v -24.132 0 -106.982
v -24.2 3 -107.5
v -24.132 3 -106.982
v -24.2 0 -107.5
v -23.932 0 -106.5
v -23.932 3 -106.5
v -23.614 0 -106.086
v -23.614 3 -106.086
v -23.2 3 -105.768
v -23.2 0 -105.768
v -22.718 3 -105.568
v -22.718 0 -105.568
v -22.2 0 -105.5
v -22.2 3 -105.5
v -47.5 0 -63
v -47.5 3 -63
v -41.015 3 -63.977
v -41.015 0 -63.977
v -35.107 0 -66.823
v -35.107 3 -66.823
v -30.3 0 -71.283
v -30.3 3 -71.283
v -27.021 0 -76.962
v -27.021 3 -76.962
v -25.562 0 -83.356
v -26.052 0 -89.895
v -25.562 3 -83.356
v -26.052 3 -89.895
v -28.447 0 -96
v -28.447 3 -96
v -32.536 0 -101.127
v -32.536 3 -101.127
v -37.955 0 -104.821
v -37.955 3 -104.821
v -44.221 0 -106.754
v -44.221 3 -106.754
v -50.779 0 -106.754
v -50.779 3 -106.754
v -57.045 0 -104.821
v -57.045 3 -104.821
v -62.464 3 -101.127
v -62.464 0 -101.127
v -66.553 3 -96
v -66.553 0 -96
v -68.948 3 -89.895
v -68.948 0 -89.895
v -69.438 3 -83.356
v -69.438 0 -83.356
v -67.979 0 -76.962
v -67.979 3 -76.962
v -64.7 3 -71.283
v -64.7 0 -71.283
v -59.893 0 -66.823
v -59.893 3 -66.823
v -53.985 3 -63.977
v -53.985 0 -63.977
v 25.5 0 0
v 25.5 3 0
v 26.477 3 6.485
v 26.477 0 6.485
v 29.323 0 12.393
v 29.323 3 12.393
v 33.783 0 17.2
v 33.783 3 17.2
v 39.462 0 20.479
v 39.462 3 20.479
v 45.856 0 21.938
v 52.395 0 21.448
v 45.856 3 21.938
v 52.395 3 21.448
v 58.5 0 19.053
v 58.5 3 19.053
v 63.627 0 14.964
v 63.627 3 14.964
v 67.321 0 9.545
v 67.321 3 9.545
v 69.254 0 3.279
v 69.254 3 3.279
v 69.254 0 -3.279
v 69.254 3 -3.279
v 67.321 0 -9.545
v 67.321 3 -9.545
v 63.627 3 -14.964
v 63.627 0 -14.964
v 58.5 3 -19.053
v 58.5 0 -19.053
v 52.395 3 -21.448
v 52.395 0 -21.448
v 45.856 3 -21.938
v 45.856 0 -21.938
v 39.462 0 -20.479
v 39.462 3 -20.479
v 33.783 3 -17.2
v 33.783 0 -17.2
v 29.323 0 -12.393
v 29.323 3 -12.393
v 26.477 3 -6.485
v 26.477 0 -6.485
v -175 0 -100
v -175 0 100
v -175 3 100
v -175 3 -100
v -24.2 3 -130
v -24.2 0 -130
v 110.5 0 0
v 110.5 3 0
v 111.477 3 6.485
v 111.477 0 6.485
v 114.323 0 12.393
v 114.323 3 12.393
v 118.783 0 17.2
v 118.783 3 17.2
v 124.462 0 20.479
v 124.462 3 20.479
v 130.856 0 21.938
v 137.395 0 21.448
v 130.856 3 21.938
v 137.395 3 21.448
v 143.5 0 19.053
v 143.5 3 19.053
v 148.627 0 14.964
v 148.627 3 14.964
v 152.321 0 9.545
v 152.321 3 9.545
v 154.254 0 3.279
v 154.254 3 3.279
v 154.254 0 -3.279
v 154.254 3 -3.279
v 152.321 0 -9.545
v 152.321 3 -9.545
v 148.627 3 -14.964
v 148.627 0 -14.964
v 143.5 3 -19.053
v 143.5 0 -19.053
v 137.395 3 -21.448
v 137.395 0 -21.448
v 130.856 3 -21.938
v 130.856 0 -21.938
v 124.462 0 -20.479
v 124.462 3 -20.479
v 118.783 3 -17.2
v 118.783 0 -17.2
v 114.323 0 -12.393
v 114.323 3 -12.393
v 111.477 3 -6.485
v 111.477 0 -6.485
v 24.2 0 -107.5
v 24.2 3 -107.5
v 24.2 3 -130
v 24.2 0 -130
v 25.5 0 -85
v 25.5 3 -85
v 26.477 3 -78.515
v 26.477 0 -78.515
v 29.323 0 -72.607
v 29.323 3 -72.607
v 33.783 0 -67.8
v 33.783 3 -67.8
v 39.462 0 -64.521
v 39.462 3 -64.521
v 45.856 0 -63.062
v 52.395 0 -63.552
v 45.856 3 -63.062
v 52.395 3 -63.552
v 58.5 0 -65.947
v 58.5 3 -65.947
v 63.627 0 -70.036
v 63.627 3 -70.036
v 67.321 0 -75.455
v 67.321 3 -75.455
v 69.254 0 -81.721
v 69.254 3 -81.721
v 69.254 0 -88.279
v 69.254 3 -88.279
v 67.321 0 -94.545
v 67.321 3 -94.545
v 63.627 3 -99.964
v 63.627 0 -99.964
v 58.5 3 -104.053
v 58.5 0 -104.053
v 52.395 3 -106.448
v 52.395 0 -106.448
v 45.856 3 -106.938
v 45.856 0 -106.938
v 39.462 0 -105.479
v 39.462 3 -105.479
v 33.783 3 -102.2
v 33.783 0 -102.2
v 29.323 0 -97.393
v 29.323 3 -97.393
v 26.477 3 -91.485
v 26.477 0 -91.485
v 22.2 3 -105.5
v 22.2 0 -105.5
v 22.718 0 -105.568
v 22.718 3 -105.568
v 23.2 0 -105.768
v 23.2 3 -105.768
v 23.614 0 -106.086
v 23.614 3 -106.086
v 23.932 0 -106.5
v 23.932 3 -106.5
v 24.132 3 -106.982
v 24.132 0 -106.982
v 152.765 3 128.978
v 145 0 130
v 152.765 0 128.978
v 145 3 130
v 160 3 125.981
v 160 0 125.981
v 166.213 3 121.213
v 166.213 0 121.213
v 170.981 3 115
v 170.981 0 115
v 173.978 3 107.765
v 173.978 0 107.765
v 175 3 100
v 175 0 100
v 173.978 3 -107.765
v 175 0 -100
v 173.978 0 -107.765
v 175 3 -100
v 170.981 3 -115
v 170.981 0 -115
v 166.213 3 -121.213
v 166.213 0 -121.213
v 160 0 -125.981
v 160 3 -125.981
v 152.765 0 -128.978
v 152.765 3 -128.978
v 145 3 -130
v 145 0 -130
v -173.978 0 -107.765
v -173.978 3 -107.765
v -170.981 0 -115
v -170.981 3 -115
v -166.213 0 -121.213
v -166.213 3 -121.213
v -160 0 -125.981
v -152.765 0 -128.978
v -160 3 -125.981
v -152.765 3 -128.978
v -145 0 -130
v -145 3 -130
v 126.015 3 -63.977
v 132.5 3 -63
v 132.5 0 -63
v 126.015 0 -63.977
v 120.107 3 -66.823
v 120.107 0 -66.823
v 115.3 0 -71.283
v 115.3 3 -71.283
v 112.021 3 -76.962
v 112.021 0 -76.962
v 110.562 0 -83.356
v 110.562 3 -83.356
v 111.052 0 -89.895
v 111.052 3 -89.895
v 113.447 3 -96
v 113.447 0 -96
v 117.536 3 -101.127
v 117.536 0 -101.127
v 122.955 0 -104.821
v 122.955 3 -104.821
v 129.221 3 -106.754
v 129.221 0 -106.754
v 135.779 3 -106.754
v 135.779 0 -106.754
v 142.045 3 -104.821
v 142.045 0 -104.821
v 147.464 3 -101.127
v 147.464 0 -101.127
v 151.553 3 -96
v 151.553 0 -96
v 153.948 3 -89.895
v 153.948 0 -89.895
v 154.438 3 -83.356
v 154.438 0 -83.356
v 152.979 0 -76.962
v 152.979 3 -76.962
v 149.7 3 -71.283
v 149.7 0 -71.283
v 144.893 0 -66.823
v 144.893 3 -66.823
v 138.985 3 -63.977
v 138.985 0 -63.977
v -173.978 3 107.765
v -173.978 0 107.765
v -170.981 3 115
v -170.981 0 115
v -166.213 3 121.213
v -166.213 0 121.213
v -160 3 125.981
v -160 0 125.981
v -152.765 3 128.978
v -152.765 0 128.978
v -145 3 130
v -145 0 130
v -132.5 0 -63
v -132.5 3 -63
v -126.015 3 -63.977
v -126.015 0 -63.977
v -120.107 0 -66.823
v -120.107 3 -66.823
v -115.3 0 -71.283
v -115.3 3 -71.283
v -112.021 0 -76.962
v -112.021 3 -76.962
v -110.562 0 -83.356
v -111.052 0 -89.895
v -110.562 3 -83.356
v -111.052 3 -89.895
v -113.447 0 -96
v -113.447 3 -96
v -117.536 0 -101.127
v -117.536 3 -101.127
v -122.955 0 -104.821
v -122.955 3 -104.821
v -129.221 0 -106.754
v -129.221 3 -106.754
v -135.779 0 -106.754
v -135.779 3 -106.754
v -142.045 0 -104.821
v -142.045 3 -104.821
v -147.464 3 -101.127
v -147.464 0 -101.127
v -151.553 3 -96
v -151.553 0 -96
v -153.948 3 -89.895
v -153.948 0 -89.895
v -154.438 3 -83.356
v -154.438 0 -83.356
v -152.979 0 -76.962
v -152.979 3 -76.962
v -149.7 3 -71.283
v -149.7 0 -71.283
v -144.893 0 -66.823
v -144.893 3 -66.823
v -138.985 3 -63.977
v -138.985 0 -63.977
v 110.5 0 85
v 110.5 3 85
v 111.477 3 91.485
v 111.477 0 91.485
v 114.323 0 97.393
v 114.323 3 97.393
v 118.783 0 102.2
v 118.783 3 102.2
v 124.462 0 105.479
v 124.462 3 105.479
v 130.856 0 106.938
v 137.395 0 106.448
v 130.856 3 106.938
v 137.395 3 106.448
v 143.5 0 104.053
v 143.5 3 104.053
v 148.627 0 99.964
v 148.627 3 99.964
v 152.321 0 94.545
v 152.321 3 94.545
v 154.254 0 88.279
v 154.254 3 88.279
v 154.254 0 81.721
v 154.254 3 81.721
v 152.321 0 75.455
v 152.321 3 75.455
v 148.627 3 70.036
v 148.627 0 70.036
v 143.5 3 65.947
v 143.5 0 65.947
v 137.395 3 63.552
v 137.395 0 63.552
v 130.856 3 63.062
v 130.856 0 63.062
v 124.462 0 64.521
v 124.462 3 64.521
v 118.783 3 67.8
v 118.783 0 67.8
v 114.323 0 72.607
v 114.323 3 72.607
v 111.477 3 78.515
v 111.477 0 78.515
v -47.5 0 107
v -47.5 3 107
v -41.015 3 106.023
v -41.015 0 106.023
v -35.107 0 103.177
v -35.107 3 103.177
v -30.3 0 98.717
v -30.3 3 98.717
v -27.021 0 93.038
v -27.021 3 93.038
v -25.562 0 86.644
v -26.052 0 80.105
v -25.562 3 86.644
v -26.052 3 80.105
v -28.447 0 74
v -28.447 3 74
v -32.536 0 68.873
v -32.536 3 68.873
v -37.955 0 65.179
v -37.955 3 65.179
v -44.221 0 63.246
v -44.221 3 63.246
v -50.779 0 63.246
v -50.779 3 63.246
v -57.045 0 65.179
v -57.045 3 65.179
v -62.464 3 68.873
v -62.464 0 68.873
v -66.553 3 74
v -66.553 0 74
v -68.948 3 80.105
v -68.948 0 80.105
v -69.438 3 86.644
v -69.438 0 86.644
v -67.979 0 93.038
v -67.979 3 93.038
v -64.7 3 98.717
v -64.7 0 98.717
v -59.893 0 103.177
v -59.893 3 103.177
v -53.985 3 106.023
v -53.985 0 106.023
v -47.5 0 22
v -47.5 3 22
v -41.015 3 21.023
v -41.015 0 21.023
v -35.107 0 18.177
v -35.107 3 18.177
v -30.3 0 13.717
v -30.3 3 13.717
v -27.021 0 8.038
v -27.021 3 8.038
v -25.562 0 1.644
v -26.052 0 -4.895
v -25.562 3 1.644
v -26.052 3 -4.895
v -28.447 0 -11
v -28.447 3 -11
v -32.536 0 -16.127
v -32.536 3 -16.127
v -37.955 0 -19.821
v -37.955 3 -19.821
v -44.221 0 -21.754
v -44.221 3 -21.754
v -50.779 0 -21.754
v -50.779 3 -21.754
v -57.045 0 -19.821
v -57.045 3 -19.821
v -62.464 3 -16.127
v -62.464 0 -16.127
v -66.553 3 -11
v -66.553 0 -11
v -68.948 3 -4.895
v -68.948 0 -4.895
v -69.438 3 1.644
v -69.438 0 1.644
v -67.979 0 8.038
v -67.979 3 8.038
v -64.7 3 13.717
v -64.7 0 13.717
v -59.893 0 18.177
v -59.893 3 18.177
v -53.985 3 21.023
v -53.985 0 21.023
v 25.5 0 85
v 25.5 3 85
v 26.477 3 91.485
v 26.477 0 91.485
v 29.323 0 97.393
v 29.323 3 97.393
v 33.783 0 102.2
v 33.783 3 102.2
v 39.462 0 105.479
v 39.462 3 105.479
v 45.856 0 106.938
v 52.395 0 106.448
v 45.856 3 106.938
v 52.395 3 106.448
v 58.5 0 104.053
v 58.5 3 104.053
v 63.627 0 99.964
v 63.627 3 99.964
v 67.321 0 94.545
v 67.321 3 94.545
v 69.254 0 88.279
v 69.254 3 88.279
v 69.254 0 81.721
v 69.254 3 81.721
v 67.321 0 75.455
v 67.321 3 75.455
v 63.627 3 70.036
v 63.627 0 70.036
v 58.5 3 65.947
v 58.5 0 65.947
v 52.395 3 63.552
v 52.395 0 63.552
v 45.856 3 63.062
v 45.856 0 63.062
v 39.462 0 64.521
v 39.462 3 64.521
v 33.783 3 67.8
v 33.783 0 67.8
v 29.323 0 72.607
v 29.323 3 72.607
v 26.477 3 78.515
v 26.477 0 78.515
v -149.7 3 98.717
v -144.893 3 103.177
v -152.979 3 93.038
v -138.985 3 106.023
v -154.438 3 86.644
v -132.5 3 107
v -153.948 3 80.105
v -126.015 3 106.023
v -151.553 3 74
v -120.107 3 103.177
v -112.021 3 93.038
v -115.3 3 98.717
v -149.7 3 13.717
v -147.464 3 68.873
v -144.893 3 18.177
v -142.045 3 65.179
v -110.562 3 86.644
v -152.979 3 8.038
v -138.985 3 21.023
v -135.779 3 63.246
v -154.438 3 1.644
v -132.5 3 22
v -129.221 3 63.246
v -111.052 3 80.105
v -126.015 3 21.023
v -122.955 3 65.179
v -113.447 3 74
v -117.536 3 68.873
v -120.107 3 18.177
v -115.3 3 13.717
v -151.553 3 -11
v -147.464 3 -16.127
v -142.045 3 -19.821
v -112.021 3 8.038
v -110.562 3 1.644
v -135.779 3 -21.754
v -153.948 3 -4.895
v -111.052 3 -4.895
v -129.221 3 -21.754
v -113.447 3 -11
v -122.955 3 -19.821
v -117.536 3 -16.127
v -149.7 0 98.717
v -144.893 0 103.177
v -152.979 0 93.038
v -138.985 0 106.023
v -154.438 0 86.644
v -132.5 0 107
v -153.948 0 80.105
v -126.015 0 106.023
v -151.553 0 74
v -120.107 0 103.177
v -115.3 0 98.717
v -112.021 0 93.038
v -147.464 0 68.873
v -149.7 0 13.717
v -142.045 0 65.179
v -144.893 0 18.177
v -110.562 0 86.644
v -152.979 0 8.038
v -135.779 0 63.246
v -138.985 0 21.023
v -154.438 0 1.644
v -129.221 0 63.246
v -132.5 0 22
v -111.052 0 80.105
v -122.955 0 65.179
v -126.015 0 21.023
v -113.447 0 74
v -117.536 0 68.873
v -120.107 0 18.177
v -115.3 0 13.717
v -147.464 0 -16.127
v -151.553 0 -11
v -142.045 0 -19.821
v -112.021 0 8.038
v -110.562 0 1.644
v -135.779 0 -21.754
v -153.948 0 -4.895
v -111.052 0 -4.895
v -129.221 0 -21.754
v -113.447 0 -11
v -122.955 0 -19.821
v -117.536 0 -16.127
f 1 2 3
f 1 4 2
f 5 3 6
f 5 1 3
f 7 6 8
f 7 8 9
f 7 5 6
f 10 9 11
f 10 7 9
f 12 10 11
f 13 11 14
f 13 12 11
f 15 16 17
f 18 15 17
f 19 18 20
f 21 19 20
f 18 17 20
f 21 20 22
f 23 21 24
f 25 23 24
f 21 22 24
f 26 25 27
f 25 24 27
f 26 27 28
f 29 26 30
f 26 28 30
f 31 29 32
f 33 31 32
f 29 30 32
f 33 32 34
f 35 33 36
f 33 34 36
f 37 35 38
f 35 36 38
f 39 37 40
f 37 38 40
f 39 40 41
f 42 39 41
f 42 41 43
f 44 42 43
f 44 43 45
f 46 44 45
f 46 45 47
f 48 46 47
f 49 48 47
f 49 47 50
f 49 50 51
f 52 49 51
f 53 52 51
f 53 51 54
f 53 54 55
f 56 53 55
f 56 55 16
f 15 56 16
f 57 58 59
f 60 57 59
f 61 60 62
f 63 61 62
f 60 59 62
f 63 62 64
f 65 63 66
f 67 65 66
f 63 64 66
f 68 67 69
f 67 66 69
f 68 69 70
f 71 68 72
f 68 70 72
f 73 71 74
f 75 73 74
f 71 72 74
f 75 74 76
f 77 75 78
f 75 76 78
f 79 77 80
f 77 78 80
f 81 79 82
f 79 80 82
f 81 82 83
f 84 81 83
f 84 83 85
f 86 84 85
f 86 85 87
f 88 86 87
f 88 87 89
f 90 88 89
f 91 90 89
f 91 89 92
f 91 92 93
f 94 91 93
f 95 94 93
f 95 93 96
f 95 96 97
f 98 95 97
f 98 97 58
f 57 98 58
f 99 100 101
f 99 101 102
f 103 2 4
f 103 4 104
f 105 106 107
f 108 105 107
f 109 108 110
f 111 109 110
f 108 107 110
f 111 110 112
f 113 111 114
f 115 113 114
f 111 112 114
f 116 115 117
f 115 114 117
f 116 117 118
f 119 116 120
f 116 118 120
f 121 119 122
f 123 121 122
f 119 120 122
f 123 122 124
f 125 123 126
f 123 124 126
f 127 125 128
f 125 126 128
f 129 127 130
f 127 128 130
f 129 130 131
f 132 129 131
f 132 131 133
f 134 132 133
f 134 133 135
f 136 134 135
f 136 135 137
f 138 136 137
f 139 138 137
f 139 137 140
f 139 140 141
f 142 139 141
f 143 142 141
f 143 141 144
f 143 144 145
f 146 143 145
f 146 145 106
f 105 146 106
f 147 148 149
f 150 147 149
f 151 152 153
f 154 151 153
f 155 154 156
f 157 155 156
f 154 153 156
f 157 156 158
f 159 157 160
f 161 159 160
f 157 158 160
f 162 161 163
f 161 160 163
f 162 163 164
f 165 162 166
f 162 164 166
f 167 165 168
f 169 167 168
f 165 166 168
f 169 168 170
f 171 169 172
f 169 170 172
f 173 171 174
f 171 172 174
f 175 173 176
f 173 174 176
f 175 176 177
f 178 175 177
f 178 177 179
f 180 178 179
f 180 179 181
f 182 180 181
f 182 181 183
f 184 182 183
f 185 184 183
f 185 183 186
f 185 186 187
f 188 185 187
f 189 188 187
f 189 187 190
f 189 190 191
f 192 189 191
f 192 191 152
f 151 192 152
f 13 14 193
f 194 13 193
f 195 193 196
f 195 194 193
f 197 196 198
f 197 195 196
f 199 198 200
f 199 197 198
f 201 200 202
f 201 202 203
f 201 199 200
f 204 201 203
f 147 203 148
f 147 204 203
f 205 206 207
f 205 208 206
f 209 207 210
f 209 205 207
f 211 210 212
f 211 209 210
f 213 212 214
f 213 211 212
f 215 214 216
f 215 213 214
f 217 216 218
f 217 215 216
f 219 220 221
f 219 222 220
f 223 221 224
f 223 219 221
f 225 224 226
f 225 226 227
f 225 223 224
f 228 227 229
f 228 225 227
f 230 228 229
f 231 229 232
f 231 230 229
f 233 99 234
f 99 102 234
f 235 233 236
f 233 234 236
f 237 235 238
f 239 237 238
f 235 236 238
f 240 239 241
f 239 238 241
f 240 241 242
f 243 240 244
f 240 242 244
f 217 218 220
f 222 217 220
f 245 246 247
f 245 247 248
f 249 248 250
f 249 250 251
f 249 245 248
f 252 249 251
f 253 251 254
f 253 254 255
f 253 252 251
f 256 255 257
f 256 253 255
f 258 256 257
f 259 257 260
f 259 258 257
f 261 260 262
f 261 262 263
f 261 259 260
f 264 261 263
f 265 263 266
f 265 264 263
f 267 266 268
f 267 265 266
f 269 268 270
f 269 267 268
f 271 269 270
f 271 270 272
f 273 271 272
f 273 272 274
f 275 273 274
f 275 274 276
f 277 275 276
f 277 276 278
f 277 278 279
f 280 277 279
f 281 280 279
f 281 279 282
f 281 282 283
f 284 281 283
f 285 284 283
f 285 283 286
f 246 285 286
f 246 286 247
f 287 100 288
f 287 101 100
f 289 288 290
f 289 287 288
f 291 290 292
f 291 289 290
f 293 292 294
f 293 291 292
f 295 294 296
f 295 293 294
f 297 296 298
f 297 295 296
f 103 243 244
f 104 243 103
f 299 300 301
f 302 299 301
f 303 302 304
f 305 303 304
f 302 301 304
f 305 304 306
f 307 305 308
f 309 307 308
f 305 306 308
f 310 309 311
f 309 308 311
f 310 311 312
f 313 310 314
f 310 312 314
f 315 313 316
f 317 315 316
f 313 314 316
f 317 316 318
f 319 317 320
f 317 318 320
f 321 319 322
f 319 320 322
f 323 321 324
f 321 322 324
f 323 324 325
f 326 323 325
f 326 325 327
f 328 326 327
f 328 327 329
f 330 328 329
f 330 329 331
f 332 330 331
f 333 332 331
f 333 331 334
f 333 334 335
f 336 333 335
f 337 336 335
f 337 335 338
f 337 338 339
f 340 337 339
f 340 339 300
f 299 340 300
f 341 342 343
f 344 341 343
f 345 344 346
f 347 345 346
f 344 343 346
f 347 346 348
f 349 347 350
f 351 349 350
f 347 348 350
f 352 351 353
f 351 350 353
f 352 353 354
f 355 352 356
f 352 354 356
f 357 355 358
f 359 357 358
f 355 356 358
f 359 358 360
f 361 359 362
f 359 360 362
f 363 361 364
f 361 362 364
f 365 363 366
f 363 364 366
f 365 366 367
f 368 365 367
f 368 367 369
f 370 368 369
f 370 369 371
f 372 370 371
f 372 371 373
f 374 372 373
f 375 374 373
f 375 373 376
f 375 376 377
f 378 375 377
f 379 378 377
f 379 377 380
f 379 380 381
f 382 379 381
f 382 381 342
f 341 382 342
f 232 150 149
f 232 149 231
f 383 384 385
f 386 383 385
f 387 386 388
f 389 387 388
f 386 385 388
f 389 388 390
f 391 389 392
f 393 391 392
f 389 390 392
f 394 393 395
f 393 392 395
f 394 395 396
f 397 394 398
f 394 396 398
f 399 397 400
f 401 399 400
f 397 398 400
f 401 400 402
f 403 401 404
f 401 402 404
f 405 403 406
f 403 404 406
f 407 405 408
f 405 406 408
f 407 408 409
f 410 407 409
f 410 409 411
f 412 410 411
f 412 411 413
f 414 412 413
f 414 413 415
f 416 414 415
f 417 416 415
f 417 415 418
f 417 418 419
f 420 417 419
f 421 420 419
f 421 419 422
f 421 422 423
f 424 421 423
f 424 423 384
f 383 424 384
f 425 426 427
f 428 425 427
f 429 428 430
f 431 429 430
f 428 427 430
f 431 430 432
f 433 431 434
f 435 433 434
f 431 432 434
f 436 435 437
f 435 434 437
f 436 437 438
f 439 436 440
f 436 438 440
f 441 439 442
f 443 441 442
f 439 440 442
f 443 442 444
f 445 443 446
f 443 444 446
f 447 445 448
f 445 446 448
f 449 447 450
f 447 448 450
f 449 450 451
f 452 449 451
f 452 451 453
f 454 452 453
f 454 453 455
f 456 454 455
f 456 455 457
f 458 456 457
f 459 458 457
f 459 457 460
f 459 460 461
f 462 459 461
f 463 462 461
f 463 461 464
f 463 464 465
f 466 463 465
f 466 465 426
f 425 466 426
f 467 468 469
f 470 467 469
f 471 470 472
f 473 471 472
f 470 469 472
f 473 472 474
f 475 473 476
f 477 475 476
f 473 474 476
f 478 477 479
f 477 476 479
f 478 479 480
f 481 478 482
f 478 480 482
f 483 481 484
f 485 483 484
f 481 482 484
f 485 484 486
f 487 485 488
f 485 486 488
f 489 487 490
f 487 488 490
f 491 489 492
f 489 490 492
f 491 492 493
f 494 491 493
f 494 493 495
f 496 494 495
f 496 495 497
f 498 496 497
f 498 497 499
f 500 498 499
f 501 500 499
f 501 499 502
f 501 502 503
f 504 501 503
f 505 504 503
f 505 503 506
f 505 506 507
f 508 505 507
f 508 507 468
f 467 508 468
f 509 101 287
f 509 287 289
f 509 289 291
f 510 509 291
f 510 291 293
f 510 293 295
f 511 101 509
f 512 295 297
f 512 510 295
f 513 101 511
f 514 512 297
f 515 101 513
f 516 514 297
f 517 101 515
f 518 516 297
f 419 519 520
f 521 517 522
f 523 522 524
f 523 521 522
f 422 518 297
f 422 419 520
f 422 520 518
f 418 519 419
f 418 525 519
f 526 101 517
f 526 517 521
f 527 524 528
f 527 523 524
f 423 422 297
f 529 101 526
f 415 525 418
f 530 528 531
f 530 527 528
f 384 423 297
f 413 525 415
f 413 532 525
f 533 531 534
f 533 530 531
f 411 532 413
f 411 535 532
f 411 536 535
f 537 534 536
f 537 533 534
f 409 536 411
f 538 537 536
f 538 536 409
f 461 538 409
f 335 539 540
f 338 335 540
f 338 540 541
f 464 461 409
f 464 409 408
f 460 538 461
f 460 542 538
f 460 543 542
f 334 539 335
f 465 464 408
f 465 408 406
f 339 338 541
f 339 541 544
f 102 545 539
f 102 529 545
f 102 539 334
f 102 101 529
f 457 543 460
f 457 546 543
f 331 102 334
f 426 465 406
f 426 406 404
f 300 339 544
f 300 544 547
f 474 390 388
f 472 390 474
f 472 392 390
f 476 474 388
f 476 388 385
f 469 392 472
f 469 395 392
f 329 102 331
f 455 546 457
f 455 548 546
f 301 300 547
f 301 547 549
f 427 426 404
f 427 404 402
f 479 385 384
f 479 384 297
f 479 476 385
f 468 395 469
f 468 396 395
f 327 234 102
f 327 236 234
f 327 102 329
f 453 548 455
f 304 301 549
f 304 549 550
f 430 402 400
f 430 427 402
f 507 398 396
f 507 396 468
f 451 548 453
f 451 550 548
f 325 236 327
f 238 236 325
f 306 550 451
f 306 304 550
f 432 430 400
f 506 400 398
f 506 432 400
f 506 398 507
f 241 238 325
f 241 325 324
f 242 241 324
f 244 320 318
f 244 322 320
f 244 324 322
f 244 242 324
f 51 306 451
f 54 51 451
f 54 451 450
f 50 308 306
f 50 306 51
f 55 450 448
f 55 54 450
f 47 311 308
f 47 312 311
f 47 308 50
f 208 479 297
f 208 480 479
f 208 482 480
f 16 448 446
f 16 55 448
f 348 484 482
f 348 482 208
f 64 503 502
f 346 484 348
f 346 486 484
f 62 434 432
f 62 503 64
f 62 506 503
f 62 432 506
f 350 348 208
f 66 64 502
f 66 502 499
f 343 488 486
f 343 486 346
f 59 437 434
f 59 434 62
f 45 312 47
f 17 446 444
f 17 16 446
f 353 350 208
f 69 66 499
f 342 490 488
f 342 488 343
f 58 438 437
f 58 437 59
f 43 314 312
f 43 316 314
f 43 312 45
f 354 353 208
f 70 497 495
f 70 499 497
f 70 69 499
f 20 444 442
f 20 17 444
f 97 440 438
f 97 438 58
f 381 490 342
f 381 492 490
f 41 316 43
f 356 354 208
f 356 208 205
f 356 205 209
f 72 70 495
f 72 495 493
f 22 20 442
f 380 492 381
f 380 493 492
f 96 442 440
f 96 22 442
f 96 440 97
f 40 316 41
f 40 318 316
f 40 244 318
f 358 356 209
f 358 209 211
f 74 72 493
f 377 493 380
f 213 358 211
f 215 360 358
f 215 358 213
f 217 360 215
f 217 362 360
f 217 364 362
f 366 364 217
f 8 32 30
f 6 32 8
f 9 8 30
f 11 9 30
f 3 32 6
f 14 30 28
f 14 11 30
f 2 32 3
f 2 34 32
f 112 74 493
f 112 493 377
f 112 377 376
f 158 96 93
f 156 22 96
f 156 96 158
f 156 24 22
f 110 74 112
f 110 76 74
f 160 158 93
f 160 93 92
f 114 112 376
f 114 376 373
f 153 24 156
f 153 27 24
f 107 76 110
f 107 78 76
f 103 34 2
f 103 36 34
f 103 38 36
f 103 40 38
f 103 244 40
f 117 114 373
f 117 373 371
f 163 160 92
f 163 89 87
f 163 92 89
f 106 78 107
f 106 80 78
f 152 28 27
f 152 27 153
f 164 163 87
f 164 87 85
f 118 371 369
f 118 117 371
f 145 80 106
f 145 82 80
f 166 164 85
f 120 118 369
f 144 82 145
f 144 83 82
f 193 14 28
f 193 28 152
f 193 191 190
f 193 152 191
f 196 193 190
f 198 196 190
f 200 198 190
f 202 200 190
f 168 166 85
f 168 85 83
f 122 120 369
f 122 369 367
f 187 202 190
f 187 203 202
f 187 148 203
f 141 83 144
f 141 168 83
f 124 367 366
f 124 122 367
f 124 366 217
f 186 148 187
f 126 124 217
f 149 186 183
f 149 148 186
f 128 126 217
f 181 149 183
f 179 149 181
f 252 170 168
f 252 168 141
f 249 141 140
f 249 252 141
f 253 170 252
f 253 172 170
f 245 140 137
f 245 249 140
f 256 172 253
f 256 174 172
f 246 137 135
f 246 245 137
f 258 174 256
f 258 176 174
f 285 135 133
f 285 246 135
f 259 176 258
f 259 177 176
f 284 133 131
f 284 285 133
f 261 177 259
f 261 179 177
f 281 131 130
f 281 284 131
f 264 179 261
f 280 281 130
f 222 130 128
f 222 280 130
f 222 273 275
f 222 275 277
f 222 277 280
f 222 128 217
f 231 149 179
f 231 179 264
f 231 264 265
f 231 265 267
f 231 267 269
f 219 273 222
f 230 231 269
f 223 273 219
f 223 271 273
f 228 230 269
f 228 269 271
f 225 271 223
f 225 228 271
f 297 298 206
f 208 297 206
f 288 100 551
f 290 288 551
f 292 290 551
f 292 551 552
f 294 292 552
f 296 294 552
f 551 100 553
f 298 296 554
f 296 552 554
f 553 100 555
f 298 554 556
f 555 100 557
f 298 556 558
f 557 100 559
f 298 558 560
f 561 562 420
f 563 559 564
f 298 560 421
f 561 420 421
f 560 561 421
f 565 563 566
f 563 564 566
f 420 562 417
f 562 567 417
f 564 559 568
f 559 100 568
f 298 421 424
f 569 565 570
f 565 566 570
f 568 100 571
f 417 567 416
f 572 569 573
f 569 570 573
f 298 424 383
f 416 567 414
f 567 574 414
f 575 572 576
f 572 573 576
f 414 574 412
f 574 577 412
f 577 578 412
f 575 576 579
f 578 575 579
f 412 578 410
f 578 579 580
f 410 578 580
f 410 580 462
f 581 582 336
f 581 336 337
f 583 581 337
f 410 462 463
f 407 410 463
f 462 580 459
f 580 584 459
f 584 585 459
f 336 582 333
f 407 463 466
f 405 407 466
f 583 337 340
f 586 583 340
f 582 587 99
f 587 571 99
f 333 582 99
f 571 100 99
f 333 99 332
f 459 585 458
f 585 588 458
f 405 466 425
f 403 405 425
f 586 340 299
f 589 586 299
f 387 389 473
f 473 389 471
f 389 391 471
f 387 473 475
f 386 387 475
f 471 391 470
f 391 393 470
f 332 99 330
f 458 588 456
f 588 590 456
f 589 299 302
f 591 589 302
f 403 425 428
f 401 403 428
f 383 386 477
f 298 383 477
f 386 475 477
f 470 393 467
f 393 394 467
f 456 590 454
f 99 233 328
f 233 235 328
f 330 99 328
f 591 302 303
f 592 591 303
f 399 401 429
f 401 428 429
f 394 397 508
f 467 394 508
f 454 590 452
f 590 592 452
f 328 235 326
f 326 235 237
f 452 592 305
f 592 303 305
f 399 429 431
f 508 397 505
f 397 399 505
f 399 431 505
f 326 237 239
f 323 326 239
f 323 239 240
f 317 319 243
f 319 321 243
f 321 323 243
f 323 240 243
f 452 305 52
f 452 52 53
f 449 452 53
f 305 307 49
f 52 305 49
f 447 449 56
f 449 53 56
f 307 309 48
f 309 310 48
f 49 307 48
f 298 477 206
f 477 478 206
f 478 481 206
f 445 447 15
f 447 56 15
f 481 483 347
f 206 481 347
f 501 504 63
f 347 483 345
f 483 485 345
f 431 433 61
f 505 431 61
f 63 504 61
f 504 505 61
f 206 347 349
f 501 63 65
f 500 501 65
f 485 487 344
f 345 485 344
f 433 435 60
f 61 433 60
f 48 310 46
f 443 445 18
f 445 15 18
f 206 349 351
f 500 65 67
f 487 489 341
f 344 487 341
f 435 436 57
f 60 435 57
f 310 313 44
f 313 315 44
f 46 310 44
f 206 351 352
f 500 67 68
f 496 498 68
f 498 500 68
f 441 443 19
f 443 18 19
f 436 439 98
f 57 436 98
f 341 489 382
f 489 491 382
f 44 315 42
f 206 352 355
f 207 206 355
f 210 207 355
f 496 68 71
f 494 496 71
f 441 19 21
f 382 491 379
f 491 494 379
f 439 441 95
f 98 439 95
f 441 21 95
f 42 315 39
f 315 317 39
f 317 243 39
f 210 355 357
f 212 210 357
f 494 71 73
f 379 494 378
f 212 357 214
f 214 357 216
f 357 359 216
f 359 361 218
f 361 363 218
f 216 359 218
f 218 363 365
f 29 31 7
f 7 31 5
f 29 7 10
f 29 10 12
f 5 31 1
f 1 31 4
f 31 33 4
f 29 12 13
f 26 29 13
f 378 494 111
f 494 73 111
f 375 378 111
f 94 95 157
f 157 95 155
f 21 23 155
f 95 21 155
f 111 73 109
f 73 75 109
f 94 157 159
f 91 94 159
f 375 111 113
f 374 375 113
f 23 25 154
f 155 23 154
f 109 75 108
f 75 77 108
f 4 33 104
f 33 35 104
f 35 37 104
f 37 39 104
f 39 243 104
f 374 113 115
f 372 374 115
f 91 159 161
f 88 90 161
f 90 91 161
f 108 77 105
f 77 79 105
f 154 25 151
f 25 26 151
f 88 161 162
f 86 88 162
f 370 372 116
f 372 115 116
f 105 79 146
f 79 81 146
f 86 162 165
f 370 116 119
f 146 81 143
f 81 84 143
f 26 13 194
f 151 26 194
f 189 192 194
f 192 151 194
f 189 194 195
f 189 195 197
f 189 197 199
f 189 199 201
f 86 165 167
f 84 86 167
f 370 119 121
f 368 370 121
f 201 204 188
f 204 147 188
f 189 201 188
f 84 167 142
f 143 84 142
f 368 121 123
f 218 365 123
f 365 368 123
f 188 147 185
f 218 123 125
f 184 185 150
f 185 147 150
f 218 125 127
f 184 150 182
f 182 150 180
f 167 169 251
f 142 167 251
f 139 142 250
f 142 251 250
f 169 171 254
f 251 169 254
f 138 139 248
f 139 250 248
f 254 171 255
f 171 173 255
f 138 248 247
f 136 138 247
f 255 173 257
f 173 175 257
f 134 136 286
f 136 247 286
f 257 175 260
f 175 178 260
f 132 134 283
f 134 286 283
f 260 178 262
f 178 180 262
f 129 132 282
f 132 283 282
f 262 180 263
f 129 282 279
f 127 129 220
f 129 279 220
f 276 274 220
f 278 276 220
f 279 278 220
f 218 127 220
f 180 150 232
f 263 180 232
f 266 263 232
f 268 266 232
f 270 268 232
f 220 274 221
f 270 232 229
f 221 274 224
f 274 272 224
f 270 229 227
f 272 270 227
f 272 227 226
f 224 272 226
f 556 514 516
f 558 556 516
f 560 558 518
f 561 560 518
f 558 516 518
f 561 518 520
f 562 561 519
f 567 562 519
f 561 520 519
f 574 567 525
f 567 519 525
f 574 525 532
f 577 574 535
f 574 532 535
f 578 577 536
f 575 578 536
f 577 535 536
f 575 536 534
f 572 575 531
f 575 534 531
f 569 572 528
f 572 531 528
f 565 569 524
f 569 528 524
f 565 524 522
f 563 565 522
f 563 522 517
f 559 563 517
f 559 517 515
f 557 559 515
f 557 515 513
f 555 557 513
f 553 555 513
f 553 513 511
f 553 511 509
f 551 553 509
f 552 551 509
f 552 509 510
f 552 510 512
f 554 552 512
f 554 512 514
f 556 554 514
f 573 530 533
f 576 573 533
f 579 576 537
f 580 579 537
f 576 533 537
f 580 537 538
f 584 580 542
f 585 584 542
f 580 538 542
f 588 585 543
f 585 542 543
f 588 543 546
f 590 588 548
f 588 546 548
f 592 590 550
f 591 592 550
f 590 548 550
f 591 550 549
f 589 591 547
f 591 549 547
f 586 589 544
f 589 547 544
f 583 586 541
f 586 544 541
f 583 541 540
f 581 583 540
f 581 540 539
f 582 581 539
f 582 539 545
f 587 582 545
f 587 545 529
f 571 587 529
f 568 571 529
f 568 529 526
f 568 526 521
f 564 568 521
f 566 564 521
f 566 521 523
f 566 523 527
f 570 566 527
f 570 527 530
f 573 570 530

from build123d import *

# Parameters (mm, degrees)
SKETCH_1_W                  = 350
SKETCH_1_H                  = 260
EXTRUDE_1_DEPTH             = 3
FILLET_2_R                  = 30
CUT_EXTRUDE_2_REACH         = 220.023
SKETCH_3_R                  = 22
PATTERN_LINEAR_1_COUNT      = 2
PATTERN_LINEAR_1_PITCH      = 85
PATTERN_LINEAR_1_COUNT_DIR2 = 3
PATTERN_LINEAR_1_PITCH_DIR2 = 85
MIRROR_1_COPY_1_REACH       = 220.023
MIRROR_1_COPY_1_SKETCH_R    = 22
MIRROR_1_COPY_2_REACH       = 220.023
MIRROR_1_COPY_2_SKETCH_R    = 22
MIRROR_1_COPY_3_REACH       = 220.023
MIRROR_1_COPY_3_SKETCH_R    = 22
MIRROR_1_COPY_4_REACH       = 220.023
MIRROR_1_COPY_4_SKETCH_R    = 22
MIRROR_1_COPY_5_REACH       = 220.023
MIRROR_1_COPY_5_SKETCH_R    = 22
CUT_EXTRUDE_3_REACH         = 220.023
SKETCH_4_W                  = 48.4
SKETCH_4_H                  = 24.5
FILLET_3_R                  = 2


with BuildPart() as part:
    # 草圖1 → 填料-伸長1 (new body)
    with BuildSketch(Plane(origin=(0, 0, 0), x_dir=(1, 0, 0), z_dir=(0, 1, 0))):
        Rectangle(SKETCH_1_W, SKETCH_1_H)
    extrude(amount=EXTRUDE_1_DEPTH)

    # 圓角2
    fillet_2_edges = [part.edges().sort_by_distance(p)[0] for p in [
        (175, 1.5, 130),
        (-175, 1.5, 130),
        (-175, 1.5, -130),
        (175, 1.5, -130),
    ]]
    fillet(fillet_2_edges, radius=FILLET_2_R)

    # 草圖3 → 除料-伸長2 (cut, up to next)
    with BuildSketch(Plane(origin=(0, 3, 0), x_dir=(1, 0, 0), z_dir=(0, 1, 0)), mode=Mode.PRIVATE) as cut_extrude_2_sk1:
        with Locations(Location((-132.5, 85, 0), (0, 0, 270))):
            Circle(SKETCH_3_R)
    cut_extrude_2_tool1 = extrude(cut_extrude_2_sk1.sketch, amount=-CUT_EXTRUDE_2_REACH, mode=Mode.PRIVATE) & part.part
    cut_extrude_2 = cut_extrude_2_tool1.solids().sort_by_distance((-132.5, 3, -85))[0]
    add(cut_extrude_2, mode=Mode.SUBTRACT)

    # 直線複製排列1: Cut-Extrude 2 2 × 3
    with Locations(*[(i * PATTERN_LINEAR_1_PITCH, 0, j * PATTERN_LINEAR_1_PITCH_DIR2) for i in range(PATTERN_LINEAR_1_COUNT) for j in range(PATTERN_LINEAR_1_COUNT_DIR2) if (i, j) != (0, 0)]):
        add(cut_extrude_2, mode=Mode.SUBTRACT)

    # 鏡射1: 除料-伸長2 across plane
    add(cut_extrude_2.mirror(Plane(origin=(0, 0, 0), x_dir=(0, 0, 1), z_dir=(1, 0, 0))), mode=Mode.SUBTRACT)

    # 鏡射1 copy 1 sketch → 鏡射1 copy 1 (cut, up to next)
    with BuildSketch(Plane(origin=(0, 3, 85), x_dir=(-1, 0, 0), z_dir=(0, 1, 0)), mode=Mode.PRIVATE) as mirror_1_copy_1_sk1:
        with Locations((-132.5, -85)):
            Circle(MIRROR_1_COPY_1_SKETCH_R)
    mirror_1_copy_1_tool1 = extrude(mirror_1_copy_1_sk1.sketch, amount=-MIRROR_1_COPY_1_REACH, mode=Mode.PRIVATE) & part.part
    add(mirror_1_copy_1_tool1.solids().sort_by_distance((132.5, 3, 0))[0], mode=Mode.SUBTRACT)

    # 鏡射1 copy 2 sketch → 鏡射1 copy 2 (cut, up to next)
    with BuildSketch(Plane(origin=(0, 3, 170), x_dir=(-1, 0, 0), z_dir=(0, 1, 0)), mode=Mode.PRIVATE) as mirror_1_copy_2_sk1:
        with Locations((-132.5, -85)):
            Circle(MIRROR_1_COPY_2_SKETCH_R)
    mirror_1_copy_2_tool1 = extrude(mirror_1_copy_2_sk1.sketch, amount=-MIRROR_1_COPY_2_REACH, mode=Mode.PRIVATE) & part.part
    add(mirror_1_copy_2_tool1.solids().sort_by_distance((132.5, 3, 85))[0], mode=Mode.SUBTRACT)

    # 鏡射1 copy 3 sketch → 鏡射1 copy 3 (cut, up to next)
    with BuildSketch(Plane(origin=(-85, 3, 0), x_dir=(-1, 0, 0), z_dir=(0, 1, 0)), mode=Mode.PRIVATE) as mirror_1_copy_3_sk1:
        with Locations((-132.5, -85)):
            Circle(MIRROR_1_COPY_3_SKETCH_R)
    mirror_1_copy_3_tool1 = extrude(mirror_1_copy_3_sk1.sketch, amount=-MIRROR_1_COPY_3_REACH, mode=Mode.PRIVATE) & part.part
    add(mirror_1_copy_3_tool1.solids().sort_by_distance((47.5, 3, -85))[0], mode=Mode.SUBTRACT)

    # 鏡射1 copy 4 sketch → 鏡射1 copy 4 (cut, up to next)
    with BuildSketch(Plane(origin=(-85, 3, 85), x_dir=(-1, 0, 0), z_dir=(0, 1, 0)), mode=Mode.PRIVATE) as mirror_1_copy_4_sk1:
        with Locations((-132.5, -85)):
            Circle(MIRROR_1_COPY_4_SKETCH_R)
    mirror_1_copy_4_tool1 = extrude(mirror_1_copy_4_sk1.sketch, amount=-MIRROR_1_COPY_4_REACH, mode=Mode.PRIVATE) & part.part
    add(mirror_1_copy_4_tool1.solids().sort_by_distance((47.5, 3, 0))[0], mode=Mode.SUBTRACT)

    # 鏡射1 copy 5 sketch → 鏡射1 copy 5 (cut, up to next)
    with BuildSketch(Plane(origin=(-85, 3, 170), x_dir=(-1, 0, 0), z_dir=(0, 1, 0)), mode=Mode.PRIVATE) as mirror_1_copy_5_sk1:
        with Locations((-132.5, -85)):
            Circle(MIRROR_1_COPY_5_SKETCH_R)
    mirror_1_copy_5_tool1 = extrude(mirror_1_copy_5_sk1.sketch, amount=-MIRROR_1_COPY_5_REACH, mode=Mode.PRIVATE) & part.part
    add(mirror_1_copy_5_tool1.solids().sort_by_distance((47.5, 3, 85))[0], mode=Mode.SUBTRACT)

    # 草圖4 → 除料-伸長3 (cut, up to next)
    with BuildSketch(Plane(origin=(0, 3, 0), x_dir=(1, 0, 0), z_dir=(0, 1, 0)), mode=Mode.PRIVATE) as cut_extrude_3_sk1:
        with Locations((0, 117.75)):
            Rectangle(SKETCH_4_W, SKETCH_4_H)
    cut_extrude_3_tool1 = extrude(cut_extrude_3_sk1.sketch, amount=-CUT_EXTRUDE_3_REACH, mode=Mode.PRIVATE) & part.part
    add(cut_extrude_3_tool1.solids().sort_by_distance((0, 3, -117.75))[0], mode=Mode.SUBTRACT)

    # 圓角3
    fillet_3_edges = [part.edges().sort_by_distance(p)[0] for p in [
        (-24.2, 1.5, -105.5),
        (24.2, 1.5, -105.5),
    ]]
    fillet(fillet_3_edges, radius=FILLET_3_R)


solid = part.part
